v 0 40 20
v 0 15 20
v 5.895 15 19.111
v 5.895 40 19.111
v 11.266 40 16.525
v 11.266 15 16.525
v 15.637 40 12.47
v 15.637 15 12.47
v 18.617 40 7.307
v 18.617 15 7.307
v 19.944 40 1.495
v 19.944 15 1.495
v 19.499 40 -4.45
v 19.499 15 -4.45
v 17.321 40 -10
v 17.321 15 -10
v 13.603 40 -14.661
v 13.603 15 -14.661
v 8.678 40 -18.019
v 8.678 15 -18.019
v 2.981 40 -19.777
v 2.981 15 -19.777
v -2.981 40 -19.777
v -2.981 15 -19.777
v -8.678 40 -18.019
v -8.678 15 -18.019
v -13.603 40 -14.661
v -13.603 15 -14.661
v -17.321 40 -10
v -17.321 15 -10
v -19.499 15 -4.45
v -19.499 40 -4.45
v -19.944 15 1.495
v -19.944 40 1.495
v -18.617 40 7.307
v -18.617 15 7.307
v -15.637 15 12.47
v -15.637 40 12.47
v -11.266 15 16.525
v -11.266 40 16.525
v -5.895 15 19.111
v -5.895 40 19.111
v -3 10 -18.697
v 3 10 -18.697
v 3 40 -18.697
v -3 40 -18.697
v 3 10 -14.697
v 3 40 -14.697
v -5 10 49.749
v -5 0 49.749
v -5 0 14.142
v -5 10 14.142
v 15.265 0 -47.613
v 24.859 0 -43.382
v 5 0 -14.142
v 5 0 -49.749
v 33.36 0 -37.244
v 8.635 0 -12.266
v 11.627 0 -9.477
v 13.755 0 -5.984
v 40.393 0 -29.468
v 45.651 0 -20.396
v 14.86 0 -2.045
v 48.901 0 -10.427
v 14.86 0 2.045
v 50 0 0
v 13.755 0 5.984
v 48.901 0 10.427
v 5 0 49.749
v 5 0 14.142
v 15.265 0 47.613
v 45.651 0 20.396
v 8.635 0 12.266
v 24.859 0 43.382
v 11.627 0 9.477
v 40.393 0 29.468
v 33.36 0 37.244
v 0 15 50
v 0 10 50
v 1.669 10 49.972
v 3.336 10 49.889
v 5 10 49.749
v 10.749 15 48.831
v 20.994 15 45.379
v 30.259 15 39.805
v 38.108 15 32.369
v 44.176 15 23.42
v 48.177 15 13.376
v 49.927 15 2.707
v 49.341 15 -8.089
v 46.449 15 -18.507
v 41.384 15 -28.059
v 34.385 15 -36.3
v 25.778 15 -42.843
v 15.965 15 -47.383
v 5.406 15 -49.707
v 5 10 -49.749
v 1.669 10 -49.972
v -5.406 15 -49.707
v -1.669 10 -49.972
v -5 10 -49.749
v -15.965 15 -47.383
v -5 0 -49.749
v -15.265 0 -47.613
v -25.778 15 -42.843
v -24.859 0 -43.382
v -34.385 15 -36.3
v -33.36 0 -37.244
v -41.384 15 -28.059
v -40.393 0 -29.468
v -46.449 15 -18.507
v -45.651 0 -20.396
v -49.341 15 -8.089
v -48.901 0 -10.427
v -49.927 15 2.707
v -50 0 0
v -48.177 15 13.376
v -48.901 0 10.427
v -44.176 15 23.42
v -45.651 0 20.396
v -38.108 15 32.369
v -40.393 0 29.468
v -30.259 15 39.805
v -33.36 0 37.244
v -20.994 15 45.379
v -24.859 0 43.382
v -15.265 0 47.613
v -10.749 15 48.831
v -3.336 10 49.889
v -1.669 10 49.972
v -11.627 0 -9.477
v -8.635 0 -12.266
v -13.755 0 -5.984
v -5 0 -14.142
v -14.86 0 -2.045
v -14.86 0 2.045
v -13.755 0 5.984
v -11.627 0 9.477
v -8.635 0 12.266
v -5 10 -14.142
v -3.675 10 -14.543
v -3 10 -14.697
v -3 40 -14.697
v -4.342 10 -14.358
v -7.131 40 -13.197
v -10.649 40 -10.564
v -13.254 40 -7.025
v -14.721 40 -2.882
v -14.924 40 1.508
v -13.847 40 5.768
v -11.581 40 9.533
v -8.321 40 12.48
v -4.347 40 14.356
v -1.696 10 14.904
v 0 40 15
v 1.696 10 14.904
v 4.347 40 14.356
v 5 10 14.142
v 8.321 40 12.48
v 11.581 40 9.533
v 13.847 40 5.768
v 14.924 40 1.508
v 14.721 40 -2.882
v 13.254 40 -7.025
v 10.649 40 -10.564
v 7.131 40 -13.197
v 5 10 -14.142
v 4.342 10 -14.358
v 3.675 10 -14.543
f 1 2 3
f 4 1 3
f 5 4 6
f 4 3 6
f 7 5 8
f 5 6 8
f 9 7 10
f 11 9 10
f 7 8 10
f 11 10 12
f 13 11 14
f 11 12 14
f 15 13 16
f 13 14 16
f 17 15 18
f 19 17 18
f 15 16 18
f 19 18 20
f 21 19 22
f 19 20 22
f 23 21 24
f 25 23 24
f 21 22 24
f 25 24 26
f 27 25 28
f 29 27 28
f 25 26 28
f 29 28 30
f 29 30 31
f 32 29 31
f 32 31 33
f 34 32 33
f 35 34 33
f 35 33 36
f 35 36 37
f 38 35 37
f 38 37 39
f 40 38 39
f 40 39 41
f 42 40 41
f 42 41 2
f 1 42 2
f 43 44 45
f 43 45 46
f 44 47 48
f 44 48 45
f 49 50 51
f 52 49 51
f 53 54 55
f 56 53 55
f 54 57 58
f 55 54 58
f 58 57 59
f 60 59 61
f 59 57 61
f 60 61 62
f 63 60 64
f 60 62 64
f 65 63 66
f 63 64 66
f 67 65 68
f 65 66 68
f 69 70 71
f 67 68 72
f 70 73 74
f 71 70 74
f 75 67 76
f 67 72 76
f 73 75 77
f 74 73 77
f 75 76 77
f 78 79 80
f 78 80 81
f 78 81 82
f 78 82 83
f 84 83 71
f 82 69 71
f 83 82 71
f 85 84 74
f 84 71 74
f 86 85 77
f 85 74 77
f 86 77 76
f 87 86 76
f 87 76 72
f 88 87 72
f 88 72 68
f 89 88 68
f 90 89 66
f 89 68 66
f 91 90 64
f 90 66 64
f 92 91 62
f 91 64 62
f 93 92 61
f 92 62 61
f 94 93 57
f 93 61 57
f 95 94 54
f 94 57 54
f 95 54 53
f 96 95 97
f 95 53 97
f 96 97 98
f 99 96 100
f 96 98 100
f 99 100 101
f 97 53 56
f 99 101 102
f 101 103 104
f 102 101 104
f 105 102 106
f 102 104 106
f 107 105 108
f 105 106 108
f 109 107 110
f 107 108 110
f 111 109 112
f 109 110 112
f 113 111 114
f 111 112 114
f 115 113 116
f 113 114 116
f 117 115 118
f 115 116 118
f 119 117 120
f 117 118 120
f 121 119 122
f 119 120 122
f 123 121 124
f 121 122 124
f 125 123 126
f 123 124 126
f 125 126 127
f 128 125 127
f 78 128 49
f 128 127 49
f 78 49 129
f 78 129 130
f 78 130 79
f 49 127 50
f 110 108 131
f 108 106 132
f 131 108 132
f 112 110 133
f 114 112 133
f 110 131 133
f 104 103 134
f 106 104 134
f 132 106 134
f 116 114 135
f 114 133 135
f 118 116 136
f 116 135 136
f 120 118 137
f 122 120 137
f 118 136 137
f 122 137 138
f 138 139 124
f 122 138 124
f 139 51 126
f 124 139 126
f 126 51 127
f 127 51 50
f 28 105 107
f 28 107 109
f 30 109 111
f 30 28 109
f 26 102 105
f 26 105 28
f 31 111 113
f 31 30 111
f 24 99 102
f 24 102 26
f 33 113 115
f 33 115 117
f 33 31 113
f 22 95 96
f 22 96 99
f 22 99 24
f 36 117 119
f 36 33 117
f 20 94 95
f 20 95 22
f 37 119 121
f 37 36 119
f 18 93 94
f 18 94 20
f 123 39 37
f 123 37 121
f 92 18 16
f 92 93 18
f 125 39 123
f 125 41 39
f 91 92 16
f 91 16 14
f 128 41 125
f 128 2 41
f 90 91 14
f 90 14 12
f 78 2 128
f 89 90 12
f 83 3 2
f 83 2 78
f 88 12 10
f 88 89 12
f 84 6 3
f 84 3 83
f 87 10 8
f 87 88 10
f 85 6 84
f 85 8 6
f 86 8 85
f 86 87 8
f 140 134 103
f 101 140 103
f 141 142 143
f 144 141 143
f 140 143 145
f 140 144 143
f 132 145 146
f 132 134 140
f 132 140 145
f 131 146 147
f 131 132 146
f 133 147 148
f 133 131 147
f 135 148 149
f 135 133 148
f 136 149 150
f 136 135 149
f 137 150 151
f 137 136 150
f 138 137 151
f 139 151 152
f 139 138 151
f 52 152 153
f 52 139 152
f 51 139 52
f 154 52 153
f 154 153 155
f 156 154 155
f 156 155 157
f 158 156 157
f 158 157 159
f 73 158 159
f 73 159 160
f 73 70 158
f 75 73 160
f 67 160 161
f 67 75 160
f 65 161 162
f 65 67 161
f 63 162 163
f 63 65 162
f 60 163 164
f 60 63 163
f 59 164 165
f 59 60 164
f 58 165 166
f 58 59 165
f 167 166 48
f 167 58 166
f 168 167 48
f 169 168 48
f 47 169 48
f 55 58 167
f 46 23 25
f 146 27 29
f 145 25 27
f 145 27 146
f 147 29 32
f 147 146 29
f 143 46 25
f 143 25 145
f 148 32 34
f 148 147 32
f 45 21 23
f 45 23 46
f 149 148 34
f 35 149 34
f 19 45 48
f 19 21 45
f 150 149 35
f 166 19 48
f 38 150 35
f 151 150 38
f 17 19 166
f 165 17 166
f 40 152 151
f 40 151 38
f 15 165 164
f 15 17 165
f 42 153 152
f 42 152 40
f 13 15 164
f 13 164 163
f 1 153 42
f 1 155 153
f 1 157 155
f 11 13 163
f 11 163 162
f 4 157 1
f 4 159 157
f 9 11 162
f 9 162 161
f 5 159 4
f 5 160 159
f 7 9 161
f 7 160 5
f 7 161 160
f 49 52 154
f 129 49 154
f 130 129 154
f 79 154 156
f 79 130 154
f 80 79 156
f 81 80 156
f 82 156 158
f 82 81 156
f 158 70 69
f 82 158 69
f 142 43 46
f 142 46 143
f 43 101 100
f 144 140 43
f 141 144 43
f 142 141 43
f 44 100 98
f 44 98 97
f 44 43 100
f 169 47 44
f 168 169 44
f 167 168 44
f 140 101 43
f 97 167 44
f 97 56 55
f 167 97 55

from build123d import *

# Parameters (mm, degrees)
SKETCH1_R           = 50
SKETCH1_R_2         = 20
BOSS_EXTRUDE1_DEPTH = 15
SKETCH1_3_R         = 20
BOSS_EXTRUDE2_DEPTH = 40
CUT_EXTRUDE1_DEPTH  = 10


with BuildPart() as part:
    # Sketch1 → Boss-Extrude1 (new body)
    with BuildSketch(Plane(origin=(0, 0, 0), x_dir=(1, 0, 0), z_dir=(0, 1, 0))):
        Circle(SKETCH1_R)
        Circle(SKETCH1_R_2, mode=Mode.SUBTRACT)
    extrude(amount=BOSS_EXTRUDE1_DEPTH)

    # Sketch1<3> → Boss-Extrude2 (add)
    with BuildSketch(Plane(origin=(0, 0, 0), x_dir=(1, 0, 0), z_dir=(0, 1, 0))):
        Circle(SKETCH1_3_R)
        with BuildLine():
            ThreePointArc((3, 14.696938457), (0, -15), (-3, 14.696938457))
            Line((-3, 14.696938457), (-3, 18.696938457))
            Line((-3, 18.696938457), (3, 18.696938457))
            Line((3, 18.696938457), (3, 14.696938457))
        make_face(mode=Mode.SUBTRACT)
    extrude(amount=BOSS_EXTRUDE2_DEPTH)

    # Sketch2 → Cut-Extrude1 (cut)
    with BuildSketch(Plane.XZ):
        with BuildLine():
            Line((-5, 49.749371855), (-5, -49.749371855))
            ThreePointArc((-5, -49.749371855), (0, -50), (5, -49.749371855))
            Line((5, -49.749371855), (5, 49.749371855))
            ThreePointArc((5, 49.749371855), (0, 50), (-5, 49.749371855))
        make_face()
    extrude(amount=-CUT_EXTRUDE1_DEPTH, mode=Mode.SUBTRACT)


solid = part.part
